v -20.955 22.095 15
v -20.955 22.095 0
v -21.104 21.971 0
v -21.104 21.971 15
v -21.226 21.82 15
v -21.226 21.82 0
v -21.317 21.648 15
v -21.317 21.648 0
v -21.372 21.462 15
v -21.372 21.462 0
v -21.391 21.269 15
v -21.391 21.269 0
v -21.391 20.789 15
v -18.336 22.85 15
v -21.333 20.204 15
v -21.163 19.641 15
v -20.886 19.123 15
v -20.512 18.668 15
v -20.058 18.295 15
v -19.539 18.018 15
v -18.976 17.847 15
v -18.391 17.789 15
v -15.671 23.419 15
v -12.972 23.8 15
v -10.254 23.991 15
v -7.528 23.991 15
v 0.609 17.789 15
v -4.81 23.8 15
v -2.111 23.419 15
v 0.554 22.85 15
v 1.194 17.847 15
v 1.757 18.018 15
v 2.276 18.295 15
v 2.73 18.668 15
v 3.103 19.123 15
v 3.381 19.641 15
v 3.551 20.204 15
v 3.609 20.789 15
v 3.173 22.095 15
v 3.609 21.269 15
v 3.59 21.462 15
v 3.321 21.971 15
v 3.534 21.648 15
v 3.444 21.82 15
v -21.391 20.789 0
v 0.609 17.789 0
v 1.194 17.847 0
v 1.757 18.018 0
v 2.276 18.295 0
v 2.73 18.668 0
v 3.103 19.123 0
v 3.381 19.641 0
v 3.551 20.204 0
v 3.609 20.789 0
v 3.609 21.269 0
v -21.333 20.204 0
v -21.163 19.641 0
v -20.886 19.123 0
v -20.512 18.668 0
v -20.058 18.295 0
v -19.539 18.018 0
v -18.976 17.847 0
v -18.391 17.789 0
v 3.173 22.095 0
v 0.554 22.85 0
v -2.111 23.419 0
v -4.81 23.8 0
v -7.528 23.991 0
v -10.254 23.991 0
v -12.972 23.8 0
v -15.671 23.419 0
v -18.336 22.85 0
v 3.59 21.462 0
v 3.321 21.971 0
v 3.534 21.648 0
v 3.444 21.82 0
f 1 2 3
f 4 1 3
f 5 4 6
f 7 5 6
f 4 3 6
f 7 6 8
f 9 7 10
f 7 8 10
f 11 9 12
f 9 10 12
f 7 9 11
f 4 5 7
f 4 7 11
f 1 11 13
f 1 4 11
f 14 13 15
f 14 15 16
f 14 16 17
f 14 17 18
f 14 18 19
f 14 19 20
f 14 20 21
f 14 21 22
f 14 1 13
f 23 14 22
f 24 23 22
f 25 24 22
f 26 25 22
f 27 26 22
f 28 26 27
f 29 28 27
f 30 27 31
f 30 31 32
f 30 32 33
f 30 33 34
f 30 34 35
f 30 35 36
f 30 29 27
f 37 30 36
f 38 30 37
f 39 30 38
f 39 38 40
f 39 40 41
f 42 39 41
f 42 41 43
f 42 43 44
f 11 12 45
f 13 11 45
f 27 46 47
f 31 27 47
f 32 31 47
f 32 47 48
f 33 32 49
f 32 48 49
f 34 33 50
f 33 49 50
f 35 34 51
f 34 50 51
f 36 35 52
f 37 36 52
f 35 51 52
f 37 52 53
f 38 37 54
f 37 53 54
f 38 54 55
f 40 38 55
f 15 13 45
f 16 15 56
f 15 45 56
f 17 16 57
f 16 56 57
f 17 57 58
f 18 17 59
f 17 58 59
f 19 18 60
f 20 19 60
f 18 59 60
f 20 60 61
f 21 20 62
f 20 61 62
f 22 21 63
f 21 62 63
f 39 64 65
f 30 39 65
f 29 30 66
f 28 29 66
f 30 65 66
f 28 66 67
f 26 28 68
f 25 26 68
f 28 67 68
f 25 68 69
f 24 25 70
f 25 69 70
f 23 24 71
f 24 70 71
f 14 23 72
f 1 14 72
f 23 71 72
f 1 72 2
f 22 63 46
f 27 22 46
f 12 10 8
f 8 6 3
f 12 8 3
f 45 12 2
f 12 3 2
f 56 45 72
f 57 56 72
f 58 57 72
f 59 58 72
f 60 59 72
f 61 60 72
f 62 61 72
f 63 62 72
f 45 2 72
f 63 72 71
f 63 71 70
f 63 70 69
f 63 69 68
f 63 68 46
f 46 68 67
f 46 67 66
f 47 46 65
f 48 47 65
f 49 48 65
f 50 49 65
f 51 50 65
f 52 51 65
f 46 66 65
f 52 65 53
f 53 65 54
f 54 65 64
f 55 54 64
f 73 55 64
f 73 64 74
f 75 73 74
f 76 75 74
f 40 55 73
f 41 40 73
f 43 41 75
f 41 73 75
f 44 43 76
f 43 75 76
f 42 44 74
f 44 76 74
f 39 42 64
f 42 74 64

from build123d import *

# Parameters (mm, degrees)
F1_DEPTH = 15


with BuildPart() as f1:
    # F0 (on Top) → F1 (new body)
    with BuildSketch(Plane.XY):
        with BuildLine():
            ThreePointArc((-21.391129, 20.789386), (-20.512449, 18.668066), (-18.391129, 17.789386))
            Line((-18.391129, 17.789386), (0.608871, 17.789386))
            ThreePointArc((0.608871, 17.789386), (2.730191, 18.668066), (3.608871, 20.789386))
            Line((3.608871, 20.789386), (3.608871, 21.269183))
            ThreePointArc((3.608871, 21.269183), (3.49309, 21.736256), (3.172557, 22.095172))
            ThreePointArc((3.172557, 22.095172), (-8.891129, 24.014756), (-20.954815, 22.095172))
            ThreePointArc((-20.954815, 22.095172), (-21.275348, 21.736256), (-21.391129, 21.269183))
            Line((-21.391129, 21.269183), (-21.391129, 20.789386))
        make_face()
    extrude(amount=F1_DEPTH)


solid = f1.part
